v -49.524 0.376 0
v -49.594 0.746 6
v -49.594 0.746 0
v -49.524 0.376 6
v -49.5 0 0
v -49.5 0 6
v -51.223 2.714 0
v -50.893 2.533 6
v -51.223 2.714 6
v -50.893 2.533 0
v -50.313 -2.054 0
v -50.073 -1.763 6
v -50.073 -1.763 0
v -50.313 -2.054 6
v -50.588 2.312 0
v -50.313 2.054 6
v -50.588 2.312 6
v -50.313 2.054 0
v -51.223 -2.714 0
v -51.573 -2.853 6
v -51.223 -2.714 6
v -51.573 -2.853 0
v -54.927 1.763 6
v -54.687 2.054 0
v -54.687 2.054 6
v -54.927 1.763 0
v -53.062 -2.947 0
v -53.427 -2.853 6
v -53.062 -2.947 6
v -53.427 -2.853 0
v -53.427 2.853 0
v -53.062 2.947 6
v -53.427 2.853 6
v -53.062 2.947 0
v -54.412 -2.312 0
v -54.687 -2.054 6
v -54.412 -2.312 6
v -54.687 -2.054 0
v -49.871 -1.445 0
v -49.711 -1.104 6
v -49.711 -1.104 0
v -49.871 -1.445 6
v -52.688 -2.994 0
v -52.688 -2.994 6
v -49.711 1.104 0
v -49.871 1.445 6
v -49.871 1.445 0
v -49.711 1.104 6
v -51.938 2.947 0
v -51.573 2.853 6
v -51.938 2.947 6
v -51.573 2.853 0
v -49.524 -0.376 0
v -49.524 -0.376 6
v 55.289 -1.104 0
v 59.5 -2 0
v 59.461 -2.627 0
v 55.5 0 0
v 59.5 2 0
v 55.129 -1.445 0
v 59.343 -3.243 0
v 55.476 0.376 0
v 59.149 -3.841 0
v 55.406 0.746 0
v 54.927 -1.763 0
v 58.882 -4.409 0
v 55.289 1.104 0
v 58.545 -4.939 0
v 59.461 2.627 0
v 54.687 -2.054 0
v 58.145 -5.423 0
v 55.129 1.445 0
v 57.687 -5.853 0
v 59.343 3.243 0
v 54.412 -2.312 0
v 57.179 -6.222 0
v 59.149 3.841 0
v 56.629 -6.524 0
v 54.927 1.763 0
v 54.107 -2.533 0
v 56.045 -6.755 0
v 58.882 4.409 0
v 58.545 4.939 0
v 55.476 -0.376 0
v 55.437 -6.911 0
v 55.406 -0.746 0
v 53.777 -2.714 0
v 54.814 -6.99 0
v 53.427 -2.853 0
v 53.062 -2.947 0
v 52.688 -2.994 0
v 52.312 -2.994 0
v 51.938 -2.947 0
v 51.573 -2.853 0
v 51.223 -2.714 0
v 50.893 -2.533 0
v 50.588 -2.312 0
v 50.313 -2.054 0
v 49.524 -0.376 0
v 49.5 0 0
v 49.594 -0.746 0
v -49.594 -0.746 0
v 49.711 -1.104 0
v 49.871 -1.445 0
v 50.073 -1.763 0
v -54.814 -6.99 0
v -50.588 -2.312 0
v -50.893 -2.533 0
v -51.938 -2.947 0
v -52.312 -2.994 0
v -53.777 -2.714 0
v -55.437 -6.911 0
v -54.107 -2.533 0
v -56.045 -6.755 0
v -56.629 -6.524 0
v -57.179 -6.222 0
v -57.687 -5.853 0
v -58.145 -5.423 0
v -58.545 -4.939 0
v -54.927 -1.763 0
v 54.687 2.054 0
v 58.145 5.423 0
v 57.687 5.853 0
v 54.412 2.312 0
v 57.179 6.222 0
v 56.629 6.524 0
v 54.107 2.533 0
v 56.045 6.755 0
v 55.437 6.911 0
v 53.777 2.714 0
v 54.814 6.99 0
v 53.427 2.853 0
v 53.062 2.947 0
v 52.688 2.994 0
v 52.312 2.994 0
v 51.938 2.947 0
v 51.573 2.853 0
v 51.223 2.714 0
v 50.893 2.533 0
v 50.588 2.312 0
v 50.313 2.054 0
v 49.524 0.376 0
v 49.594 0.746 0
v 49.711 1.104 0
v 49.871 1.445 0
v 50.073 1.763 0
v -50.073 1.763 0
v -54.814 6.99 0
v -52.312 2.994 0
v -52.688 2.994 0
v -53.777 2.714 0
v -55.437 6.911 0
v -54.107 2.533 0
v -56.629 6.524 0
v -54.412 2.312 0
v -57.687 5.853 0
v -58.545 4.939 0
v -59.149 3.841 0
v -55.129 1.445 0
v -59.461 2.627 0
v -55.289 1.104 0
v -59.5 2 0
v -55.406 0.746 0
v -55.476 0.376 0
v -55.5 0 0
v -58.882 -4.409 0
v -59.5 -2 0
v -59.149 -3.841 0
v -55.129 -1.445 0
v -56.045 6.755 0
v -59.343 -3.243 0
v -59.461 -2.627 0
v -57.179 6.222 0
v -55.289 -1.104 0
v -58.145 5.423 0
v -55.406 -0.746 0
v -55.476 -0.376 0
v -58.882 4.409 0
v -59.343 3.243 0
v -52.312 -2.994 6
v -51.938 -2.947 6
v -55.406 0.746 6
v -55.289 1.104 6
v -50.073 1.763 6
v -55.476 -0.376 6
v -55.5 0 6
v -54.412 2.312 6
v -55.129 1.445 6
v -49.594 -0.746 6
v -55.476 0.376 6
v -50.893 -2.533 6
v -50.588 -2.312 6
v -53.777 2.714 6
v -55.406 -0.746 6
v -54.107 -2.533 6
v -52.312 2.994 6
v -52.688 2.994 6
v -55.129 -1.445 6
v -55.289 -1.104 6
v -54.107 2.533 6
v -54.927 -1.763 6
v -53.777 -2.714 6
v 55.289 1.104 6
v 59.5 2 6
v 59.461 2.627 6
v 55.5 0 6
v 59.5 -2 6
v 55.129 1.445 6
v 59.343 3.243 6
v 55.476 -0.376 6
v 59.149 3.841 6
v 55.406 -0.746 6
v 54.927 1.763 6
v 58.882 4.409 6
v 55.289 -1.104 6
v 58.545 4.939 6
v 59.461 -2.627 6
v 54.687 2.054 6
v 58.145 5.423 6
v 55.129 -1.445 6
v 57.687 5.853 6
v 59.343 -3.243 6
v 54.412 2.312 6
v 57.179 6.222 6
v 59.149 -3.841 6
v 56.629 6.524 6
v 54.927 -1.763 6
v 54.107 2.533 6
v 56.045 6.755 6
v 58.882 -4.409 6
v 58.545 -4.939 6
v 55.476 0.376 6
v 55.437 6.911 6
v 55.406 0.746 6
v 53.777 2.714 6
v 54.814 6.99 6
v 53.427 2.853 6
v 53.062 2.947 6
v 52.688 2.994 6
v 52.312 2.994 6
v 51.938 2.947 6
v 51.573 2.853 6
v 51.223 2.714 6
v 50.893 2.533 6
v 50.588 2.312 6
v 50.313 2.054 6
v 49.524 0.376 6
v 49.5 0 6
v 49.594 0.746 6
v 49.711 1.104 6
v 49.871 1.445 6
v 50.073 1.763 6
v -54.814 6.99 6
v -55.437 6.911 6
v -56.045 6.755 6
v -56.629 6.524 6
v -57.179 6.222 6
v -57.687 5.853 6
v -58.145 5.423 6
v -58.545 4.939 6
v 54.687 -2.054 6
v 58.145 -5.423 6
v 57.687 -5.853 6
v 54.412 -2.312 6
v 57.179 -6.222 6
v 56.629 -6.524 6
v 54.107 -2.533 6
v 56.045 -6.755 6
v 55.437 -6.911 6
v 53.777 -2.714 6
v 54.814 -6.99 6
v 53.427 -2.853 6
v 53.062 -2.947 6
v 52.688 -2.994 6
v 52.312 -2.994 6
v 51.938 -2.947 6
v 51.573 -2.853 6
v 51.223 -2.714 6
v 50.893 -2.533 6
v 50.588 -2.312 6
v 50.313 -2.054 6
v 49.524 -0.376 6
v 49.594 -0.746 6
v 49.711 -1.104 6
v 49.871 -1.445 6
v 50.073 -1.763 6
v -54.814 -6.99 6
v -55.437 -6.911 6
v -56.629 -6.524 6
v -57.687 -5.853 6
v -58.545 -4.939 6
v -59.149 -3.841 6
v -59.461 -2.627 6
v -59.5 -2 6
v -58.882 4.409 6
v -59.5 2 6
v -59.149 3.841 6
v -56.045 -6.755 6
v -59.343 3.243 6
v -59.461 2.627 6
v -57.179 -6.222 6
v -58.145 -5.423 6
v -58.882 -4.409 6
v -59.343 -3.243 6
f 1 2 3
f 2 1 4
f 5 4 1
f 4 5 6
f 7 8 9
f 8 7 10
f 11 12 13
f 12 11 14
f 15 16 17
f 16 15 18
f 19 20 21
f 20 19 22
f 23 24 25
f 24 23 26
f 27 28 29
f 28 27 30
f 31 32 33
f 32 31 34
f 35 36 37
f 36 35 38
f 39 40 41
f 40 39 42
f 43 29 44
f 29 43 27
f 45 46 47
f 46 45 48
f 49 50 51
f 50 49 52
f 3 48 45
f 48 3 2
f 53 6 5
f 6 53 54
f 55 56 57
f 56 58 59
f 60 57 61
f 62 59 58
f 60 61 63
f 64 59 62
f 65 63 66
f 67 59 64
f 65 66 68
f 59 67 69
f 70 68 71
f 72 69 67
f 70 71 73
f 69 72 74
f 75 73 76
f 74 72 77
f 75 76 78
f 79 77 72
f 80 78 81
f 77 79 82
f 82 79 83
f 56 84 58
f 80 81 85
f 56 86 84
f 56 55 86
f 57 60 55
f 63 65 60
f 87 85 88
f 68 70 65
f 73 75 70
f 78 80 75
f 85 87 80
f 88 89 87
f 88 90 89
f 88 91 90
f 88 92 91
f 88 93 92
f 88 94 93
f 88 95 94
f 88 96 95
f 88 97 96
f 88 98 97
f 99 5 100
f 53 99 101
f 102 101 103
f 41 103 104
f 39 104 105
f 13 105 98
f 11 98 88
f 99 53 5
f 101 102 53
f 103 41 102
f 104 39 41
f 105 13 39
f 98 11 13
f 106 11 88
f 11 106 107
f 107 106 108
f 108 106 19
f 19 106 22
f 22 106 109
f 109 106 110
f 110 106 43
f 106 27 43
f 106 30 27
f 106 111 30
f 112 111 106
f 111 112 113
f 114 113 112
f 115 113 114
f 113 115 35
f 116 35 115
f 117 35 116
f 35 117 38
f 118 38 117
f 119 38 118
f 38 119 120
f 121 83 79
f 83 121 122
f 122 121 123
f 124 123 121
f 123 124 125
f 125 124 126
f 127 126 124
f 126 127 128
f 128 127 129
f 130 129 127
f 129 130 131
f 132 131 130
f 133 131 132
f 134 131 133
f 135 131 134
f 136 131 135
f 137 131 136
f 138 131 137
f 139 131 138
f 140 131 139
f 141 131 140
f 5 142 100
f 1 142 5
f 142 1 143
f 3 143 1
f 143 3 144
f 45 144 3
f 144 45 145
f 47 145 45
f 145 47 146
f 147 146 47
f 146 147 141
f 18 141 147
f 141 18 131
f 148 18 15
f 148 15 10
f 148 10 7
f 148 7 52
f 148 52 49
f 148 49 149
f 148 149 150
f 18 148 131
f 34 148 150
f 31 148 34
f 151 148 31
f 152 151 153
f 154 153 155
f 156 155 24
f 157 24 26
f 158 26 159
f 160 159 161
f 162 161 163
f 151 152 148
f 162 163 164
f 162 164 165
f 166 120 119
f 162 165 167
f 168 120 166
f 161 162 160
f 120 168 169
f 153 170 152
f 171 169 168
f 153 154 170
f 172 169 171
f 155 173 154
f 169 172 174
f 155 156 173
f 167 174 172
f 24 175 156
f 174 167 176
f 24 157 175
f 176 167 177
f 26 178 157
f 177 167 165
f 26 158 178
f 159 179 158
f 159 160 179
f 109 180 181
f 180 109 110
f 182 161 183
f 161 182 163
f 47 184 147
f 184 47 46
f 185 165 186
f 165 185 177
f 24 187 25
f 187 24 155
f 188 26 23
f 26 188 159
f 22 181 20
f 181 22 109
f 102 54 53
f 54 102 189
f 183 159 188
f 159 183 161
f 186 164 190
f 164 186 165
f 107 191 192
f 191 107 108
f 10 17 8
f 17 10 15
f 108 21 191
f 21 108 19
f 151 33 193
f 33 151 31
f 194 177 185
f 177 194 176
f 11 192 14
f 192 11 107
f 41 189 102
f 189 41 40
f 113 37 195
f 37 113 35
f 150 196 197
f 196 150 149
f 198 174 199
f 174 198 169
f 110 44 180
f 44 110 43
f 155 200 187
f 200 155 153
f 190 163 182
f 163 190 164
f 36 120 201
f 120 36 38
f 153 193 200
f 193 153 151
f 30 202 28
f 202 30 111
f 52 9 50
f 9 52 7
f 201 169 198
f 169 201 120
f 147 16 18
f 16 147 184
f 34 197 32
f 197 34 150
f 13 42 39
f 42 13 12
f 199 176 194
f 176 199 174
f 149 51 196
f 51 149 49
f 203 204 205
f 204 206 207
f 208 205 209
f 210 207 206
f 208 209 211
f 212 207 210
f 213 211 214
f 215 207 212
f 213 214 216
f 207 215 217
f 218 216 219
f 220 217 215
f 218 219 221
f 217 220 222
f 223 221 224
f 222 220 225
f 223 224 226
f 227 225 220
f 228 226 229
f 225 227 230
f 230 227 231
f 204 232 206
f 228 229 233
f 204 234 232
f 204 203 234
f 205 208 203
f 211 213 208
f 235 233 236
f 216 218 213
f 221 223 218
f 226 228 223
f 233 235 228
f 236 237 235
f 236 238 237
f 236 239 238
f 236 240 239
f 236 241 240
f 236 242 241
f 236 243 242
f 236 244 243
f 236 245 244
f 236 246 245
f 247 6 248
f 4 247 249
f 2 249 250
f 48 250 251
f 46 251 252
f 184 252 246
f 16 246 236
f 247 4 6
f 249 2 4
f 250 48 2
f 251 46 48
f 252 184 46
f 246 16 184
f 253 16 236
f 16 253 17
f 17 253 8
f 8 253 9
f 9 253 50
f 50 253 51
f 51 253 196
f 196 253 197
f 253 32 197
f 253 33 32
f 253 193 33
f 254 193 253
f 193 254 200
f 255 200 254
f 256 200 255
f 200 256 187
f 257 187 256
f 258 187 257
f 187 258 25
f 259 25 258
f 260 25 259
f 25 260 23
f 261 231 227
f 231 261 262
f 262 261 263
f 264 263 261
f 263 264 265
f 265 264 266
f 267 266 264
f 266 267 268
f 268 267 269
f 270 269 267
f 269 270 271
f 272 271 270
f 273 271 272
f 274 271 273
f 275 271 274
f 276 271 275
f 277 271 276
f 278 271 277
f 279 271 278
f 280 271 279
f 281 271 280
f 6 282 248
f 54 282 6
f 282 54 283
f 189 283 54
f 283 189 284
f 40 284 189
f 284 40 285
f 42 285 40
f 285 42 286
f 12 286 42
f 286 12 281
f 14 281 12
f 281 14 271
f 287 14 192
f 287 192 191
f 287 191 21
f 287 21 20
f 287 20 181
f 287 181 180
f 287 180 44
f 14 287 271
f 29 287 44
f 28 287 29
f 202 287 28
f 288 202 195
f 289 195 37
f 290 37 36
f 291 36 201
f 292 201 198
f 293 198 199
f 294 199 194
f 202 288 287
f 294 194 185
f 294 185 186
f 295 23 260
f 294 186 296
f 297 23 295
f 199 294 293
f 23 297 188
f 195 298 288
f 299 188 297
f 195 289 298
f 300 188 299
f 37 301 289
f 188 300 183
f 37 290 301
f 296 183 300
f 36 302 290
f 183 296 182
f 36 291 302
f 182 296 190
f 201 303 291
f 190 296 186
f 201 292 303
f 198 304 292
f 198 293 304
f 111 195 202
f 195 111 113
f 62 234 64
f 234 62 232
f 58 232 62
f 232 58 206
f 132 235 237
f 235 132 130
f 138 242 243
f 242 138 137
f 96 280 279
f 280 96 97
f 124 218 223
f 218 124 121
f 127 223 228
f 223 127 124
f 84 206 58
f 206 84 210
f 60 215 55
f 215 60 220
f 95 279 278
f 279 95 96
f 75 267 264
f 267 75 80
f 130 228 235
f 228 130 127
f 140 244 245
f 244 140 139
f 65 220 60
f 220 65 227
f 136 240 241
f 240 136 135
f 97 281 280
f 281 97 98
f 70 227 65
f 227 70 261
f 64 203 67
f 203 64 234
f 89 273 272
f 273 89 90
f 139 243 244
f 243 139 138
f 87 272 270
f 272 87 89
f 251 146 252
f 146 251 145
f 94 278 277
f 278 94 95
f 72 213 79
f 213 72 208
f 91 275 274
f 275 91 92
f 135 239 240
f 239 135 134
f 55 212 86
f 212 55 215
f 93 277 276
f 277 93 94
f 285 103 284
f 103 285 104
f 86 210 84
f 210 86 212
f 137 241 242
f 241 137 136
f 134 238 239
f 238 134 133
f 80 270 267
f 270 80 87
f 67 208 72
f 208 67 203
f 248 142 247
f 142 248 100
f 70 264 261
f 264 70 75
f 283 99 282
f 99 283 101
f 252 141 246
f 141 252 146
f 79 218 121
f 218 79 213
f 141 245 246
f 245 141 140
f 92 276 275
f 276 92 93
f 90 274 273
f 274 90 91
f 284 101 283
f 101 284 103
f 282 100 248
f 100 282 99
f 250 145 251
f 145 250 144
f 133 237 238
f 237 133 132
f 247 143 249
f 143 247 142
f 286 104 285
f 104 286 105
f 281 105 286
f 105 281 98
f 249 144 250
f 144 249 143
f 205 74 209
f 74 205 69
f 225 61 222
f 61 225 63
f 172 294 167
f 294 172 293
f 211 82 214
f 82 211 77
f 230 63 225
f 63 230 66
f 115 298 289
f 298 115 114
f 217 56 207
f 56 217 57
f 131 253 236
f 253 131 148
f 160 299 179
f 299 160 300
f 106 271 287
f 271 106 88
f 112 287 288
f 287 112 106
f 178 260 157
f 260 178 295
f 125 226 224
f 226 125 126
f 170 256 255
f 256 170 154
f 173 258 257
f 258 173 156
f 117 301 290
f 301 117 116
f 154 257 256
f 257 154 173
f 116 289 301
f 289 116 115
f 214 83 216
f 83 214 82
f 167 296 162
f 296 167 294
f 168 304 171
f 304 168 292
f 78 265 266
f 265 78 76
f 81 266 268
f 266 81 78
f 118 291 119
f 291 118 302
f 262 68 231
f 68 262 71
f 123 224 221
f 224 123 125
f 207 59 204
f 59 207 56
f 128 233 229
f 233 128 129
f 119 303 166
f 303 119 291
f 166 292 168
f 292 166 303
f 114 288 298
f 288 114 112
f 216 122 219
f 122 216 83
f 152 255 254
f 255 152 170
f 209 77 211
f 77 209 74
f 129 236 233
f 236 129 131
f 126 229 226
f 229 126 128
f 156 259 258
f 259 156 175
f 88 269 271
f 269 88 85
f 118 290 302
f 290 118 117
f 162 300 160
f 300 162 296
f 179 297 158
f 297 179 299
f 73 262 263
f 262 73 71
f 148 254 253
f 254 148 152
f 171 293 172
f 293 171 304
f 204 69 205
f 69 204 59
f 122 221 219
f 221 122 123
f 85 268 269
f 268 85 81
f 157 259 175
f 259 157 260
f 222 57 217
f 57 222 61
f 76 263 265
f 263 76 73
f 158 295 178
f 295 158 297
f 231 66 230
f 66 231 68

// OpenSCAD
$fn = 50;


difference() {
	union() {
		hull() {
			translate(v = [-54.5000000000, 2.0000000000, 0]) {
				cylinder(h = 6, r = 5);
			}
			translate(v = [54.5000000000, 2.0000000000, 0]) {
				cylinder(h = 6, r = 5);
			}
			translate(v = [-54.5000000000, -2.0000000000, 0]) {
				cylinder(h = 6, r = 5);
			}
			translate(v = [54.5000000000, -2.0000000000, 0]) {
				cylinder(h = 6, r = 5);
			}
		}
	}
	union() {
		translate(v = [-52.5000000000, 0.0000000000, 0]) {
			cylinder(h = 6, r = 3.0000000000);
		}
		translate(v = [52.5000000000, 0.0000000000, 0]) {
			cylinder(h = 6, r = 3.0000000000);
		}
		translate(v = [-52.5000000000, 0.0000000000, 0]) {
			cylinder(h = 6, r = 1.5000000000);
		}
		translate(v = [52.5000000000, 0.0000000000, 0]) {
			cylinder(h = 6, r = 1.5000000000);
		}
		translate(v = [-52.5000000000, 0.0000000000, 0]) {
			cylinder(h = 6, r = 1.5000000000);
		}
		translate(v = [52.5000000000, 0.0000000000, 0]) {
			cylinder(h = 6, r = 1.5000000000);
		}
		translate(v = [-52.5000000000, 0.0000000000, 0]) {
			cylinder(h = 6, r = 1.5000000000);
		}
		translate(v = [52.5000000000, 0.0000000000, 0]) {
			cylinder(h = 6, r = 1.5000000000);
		}
	}
}
